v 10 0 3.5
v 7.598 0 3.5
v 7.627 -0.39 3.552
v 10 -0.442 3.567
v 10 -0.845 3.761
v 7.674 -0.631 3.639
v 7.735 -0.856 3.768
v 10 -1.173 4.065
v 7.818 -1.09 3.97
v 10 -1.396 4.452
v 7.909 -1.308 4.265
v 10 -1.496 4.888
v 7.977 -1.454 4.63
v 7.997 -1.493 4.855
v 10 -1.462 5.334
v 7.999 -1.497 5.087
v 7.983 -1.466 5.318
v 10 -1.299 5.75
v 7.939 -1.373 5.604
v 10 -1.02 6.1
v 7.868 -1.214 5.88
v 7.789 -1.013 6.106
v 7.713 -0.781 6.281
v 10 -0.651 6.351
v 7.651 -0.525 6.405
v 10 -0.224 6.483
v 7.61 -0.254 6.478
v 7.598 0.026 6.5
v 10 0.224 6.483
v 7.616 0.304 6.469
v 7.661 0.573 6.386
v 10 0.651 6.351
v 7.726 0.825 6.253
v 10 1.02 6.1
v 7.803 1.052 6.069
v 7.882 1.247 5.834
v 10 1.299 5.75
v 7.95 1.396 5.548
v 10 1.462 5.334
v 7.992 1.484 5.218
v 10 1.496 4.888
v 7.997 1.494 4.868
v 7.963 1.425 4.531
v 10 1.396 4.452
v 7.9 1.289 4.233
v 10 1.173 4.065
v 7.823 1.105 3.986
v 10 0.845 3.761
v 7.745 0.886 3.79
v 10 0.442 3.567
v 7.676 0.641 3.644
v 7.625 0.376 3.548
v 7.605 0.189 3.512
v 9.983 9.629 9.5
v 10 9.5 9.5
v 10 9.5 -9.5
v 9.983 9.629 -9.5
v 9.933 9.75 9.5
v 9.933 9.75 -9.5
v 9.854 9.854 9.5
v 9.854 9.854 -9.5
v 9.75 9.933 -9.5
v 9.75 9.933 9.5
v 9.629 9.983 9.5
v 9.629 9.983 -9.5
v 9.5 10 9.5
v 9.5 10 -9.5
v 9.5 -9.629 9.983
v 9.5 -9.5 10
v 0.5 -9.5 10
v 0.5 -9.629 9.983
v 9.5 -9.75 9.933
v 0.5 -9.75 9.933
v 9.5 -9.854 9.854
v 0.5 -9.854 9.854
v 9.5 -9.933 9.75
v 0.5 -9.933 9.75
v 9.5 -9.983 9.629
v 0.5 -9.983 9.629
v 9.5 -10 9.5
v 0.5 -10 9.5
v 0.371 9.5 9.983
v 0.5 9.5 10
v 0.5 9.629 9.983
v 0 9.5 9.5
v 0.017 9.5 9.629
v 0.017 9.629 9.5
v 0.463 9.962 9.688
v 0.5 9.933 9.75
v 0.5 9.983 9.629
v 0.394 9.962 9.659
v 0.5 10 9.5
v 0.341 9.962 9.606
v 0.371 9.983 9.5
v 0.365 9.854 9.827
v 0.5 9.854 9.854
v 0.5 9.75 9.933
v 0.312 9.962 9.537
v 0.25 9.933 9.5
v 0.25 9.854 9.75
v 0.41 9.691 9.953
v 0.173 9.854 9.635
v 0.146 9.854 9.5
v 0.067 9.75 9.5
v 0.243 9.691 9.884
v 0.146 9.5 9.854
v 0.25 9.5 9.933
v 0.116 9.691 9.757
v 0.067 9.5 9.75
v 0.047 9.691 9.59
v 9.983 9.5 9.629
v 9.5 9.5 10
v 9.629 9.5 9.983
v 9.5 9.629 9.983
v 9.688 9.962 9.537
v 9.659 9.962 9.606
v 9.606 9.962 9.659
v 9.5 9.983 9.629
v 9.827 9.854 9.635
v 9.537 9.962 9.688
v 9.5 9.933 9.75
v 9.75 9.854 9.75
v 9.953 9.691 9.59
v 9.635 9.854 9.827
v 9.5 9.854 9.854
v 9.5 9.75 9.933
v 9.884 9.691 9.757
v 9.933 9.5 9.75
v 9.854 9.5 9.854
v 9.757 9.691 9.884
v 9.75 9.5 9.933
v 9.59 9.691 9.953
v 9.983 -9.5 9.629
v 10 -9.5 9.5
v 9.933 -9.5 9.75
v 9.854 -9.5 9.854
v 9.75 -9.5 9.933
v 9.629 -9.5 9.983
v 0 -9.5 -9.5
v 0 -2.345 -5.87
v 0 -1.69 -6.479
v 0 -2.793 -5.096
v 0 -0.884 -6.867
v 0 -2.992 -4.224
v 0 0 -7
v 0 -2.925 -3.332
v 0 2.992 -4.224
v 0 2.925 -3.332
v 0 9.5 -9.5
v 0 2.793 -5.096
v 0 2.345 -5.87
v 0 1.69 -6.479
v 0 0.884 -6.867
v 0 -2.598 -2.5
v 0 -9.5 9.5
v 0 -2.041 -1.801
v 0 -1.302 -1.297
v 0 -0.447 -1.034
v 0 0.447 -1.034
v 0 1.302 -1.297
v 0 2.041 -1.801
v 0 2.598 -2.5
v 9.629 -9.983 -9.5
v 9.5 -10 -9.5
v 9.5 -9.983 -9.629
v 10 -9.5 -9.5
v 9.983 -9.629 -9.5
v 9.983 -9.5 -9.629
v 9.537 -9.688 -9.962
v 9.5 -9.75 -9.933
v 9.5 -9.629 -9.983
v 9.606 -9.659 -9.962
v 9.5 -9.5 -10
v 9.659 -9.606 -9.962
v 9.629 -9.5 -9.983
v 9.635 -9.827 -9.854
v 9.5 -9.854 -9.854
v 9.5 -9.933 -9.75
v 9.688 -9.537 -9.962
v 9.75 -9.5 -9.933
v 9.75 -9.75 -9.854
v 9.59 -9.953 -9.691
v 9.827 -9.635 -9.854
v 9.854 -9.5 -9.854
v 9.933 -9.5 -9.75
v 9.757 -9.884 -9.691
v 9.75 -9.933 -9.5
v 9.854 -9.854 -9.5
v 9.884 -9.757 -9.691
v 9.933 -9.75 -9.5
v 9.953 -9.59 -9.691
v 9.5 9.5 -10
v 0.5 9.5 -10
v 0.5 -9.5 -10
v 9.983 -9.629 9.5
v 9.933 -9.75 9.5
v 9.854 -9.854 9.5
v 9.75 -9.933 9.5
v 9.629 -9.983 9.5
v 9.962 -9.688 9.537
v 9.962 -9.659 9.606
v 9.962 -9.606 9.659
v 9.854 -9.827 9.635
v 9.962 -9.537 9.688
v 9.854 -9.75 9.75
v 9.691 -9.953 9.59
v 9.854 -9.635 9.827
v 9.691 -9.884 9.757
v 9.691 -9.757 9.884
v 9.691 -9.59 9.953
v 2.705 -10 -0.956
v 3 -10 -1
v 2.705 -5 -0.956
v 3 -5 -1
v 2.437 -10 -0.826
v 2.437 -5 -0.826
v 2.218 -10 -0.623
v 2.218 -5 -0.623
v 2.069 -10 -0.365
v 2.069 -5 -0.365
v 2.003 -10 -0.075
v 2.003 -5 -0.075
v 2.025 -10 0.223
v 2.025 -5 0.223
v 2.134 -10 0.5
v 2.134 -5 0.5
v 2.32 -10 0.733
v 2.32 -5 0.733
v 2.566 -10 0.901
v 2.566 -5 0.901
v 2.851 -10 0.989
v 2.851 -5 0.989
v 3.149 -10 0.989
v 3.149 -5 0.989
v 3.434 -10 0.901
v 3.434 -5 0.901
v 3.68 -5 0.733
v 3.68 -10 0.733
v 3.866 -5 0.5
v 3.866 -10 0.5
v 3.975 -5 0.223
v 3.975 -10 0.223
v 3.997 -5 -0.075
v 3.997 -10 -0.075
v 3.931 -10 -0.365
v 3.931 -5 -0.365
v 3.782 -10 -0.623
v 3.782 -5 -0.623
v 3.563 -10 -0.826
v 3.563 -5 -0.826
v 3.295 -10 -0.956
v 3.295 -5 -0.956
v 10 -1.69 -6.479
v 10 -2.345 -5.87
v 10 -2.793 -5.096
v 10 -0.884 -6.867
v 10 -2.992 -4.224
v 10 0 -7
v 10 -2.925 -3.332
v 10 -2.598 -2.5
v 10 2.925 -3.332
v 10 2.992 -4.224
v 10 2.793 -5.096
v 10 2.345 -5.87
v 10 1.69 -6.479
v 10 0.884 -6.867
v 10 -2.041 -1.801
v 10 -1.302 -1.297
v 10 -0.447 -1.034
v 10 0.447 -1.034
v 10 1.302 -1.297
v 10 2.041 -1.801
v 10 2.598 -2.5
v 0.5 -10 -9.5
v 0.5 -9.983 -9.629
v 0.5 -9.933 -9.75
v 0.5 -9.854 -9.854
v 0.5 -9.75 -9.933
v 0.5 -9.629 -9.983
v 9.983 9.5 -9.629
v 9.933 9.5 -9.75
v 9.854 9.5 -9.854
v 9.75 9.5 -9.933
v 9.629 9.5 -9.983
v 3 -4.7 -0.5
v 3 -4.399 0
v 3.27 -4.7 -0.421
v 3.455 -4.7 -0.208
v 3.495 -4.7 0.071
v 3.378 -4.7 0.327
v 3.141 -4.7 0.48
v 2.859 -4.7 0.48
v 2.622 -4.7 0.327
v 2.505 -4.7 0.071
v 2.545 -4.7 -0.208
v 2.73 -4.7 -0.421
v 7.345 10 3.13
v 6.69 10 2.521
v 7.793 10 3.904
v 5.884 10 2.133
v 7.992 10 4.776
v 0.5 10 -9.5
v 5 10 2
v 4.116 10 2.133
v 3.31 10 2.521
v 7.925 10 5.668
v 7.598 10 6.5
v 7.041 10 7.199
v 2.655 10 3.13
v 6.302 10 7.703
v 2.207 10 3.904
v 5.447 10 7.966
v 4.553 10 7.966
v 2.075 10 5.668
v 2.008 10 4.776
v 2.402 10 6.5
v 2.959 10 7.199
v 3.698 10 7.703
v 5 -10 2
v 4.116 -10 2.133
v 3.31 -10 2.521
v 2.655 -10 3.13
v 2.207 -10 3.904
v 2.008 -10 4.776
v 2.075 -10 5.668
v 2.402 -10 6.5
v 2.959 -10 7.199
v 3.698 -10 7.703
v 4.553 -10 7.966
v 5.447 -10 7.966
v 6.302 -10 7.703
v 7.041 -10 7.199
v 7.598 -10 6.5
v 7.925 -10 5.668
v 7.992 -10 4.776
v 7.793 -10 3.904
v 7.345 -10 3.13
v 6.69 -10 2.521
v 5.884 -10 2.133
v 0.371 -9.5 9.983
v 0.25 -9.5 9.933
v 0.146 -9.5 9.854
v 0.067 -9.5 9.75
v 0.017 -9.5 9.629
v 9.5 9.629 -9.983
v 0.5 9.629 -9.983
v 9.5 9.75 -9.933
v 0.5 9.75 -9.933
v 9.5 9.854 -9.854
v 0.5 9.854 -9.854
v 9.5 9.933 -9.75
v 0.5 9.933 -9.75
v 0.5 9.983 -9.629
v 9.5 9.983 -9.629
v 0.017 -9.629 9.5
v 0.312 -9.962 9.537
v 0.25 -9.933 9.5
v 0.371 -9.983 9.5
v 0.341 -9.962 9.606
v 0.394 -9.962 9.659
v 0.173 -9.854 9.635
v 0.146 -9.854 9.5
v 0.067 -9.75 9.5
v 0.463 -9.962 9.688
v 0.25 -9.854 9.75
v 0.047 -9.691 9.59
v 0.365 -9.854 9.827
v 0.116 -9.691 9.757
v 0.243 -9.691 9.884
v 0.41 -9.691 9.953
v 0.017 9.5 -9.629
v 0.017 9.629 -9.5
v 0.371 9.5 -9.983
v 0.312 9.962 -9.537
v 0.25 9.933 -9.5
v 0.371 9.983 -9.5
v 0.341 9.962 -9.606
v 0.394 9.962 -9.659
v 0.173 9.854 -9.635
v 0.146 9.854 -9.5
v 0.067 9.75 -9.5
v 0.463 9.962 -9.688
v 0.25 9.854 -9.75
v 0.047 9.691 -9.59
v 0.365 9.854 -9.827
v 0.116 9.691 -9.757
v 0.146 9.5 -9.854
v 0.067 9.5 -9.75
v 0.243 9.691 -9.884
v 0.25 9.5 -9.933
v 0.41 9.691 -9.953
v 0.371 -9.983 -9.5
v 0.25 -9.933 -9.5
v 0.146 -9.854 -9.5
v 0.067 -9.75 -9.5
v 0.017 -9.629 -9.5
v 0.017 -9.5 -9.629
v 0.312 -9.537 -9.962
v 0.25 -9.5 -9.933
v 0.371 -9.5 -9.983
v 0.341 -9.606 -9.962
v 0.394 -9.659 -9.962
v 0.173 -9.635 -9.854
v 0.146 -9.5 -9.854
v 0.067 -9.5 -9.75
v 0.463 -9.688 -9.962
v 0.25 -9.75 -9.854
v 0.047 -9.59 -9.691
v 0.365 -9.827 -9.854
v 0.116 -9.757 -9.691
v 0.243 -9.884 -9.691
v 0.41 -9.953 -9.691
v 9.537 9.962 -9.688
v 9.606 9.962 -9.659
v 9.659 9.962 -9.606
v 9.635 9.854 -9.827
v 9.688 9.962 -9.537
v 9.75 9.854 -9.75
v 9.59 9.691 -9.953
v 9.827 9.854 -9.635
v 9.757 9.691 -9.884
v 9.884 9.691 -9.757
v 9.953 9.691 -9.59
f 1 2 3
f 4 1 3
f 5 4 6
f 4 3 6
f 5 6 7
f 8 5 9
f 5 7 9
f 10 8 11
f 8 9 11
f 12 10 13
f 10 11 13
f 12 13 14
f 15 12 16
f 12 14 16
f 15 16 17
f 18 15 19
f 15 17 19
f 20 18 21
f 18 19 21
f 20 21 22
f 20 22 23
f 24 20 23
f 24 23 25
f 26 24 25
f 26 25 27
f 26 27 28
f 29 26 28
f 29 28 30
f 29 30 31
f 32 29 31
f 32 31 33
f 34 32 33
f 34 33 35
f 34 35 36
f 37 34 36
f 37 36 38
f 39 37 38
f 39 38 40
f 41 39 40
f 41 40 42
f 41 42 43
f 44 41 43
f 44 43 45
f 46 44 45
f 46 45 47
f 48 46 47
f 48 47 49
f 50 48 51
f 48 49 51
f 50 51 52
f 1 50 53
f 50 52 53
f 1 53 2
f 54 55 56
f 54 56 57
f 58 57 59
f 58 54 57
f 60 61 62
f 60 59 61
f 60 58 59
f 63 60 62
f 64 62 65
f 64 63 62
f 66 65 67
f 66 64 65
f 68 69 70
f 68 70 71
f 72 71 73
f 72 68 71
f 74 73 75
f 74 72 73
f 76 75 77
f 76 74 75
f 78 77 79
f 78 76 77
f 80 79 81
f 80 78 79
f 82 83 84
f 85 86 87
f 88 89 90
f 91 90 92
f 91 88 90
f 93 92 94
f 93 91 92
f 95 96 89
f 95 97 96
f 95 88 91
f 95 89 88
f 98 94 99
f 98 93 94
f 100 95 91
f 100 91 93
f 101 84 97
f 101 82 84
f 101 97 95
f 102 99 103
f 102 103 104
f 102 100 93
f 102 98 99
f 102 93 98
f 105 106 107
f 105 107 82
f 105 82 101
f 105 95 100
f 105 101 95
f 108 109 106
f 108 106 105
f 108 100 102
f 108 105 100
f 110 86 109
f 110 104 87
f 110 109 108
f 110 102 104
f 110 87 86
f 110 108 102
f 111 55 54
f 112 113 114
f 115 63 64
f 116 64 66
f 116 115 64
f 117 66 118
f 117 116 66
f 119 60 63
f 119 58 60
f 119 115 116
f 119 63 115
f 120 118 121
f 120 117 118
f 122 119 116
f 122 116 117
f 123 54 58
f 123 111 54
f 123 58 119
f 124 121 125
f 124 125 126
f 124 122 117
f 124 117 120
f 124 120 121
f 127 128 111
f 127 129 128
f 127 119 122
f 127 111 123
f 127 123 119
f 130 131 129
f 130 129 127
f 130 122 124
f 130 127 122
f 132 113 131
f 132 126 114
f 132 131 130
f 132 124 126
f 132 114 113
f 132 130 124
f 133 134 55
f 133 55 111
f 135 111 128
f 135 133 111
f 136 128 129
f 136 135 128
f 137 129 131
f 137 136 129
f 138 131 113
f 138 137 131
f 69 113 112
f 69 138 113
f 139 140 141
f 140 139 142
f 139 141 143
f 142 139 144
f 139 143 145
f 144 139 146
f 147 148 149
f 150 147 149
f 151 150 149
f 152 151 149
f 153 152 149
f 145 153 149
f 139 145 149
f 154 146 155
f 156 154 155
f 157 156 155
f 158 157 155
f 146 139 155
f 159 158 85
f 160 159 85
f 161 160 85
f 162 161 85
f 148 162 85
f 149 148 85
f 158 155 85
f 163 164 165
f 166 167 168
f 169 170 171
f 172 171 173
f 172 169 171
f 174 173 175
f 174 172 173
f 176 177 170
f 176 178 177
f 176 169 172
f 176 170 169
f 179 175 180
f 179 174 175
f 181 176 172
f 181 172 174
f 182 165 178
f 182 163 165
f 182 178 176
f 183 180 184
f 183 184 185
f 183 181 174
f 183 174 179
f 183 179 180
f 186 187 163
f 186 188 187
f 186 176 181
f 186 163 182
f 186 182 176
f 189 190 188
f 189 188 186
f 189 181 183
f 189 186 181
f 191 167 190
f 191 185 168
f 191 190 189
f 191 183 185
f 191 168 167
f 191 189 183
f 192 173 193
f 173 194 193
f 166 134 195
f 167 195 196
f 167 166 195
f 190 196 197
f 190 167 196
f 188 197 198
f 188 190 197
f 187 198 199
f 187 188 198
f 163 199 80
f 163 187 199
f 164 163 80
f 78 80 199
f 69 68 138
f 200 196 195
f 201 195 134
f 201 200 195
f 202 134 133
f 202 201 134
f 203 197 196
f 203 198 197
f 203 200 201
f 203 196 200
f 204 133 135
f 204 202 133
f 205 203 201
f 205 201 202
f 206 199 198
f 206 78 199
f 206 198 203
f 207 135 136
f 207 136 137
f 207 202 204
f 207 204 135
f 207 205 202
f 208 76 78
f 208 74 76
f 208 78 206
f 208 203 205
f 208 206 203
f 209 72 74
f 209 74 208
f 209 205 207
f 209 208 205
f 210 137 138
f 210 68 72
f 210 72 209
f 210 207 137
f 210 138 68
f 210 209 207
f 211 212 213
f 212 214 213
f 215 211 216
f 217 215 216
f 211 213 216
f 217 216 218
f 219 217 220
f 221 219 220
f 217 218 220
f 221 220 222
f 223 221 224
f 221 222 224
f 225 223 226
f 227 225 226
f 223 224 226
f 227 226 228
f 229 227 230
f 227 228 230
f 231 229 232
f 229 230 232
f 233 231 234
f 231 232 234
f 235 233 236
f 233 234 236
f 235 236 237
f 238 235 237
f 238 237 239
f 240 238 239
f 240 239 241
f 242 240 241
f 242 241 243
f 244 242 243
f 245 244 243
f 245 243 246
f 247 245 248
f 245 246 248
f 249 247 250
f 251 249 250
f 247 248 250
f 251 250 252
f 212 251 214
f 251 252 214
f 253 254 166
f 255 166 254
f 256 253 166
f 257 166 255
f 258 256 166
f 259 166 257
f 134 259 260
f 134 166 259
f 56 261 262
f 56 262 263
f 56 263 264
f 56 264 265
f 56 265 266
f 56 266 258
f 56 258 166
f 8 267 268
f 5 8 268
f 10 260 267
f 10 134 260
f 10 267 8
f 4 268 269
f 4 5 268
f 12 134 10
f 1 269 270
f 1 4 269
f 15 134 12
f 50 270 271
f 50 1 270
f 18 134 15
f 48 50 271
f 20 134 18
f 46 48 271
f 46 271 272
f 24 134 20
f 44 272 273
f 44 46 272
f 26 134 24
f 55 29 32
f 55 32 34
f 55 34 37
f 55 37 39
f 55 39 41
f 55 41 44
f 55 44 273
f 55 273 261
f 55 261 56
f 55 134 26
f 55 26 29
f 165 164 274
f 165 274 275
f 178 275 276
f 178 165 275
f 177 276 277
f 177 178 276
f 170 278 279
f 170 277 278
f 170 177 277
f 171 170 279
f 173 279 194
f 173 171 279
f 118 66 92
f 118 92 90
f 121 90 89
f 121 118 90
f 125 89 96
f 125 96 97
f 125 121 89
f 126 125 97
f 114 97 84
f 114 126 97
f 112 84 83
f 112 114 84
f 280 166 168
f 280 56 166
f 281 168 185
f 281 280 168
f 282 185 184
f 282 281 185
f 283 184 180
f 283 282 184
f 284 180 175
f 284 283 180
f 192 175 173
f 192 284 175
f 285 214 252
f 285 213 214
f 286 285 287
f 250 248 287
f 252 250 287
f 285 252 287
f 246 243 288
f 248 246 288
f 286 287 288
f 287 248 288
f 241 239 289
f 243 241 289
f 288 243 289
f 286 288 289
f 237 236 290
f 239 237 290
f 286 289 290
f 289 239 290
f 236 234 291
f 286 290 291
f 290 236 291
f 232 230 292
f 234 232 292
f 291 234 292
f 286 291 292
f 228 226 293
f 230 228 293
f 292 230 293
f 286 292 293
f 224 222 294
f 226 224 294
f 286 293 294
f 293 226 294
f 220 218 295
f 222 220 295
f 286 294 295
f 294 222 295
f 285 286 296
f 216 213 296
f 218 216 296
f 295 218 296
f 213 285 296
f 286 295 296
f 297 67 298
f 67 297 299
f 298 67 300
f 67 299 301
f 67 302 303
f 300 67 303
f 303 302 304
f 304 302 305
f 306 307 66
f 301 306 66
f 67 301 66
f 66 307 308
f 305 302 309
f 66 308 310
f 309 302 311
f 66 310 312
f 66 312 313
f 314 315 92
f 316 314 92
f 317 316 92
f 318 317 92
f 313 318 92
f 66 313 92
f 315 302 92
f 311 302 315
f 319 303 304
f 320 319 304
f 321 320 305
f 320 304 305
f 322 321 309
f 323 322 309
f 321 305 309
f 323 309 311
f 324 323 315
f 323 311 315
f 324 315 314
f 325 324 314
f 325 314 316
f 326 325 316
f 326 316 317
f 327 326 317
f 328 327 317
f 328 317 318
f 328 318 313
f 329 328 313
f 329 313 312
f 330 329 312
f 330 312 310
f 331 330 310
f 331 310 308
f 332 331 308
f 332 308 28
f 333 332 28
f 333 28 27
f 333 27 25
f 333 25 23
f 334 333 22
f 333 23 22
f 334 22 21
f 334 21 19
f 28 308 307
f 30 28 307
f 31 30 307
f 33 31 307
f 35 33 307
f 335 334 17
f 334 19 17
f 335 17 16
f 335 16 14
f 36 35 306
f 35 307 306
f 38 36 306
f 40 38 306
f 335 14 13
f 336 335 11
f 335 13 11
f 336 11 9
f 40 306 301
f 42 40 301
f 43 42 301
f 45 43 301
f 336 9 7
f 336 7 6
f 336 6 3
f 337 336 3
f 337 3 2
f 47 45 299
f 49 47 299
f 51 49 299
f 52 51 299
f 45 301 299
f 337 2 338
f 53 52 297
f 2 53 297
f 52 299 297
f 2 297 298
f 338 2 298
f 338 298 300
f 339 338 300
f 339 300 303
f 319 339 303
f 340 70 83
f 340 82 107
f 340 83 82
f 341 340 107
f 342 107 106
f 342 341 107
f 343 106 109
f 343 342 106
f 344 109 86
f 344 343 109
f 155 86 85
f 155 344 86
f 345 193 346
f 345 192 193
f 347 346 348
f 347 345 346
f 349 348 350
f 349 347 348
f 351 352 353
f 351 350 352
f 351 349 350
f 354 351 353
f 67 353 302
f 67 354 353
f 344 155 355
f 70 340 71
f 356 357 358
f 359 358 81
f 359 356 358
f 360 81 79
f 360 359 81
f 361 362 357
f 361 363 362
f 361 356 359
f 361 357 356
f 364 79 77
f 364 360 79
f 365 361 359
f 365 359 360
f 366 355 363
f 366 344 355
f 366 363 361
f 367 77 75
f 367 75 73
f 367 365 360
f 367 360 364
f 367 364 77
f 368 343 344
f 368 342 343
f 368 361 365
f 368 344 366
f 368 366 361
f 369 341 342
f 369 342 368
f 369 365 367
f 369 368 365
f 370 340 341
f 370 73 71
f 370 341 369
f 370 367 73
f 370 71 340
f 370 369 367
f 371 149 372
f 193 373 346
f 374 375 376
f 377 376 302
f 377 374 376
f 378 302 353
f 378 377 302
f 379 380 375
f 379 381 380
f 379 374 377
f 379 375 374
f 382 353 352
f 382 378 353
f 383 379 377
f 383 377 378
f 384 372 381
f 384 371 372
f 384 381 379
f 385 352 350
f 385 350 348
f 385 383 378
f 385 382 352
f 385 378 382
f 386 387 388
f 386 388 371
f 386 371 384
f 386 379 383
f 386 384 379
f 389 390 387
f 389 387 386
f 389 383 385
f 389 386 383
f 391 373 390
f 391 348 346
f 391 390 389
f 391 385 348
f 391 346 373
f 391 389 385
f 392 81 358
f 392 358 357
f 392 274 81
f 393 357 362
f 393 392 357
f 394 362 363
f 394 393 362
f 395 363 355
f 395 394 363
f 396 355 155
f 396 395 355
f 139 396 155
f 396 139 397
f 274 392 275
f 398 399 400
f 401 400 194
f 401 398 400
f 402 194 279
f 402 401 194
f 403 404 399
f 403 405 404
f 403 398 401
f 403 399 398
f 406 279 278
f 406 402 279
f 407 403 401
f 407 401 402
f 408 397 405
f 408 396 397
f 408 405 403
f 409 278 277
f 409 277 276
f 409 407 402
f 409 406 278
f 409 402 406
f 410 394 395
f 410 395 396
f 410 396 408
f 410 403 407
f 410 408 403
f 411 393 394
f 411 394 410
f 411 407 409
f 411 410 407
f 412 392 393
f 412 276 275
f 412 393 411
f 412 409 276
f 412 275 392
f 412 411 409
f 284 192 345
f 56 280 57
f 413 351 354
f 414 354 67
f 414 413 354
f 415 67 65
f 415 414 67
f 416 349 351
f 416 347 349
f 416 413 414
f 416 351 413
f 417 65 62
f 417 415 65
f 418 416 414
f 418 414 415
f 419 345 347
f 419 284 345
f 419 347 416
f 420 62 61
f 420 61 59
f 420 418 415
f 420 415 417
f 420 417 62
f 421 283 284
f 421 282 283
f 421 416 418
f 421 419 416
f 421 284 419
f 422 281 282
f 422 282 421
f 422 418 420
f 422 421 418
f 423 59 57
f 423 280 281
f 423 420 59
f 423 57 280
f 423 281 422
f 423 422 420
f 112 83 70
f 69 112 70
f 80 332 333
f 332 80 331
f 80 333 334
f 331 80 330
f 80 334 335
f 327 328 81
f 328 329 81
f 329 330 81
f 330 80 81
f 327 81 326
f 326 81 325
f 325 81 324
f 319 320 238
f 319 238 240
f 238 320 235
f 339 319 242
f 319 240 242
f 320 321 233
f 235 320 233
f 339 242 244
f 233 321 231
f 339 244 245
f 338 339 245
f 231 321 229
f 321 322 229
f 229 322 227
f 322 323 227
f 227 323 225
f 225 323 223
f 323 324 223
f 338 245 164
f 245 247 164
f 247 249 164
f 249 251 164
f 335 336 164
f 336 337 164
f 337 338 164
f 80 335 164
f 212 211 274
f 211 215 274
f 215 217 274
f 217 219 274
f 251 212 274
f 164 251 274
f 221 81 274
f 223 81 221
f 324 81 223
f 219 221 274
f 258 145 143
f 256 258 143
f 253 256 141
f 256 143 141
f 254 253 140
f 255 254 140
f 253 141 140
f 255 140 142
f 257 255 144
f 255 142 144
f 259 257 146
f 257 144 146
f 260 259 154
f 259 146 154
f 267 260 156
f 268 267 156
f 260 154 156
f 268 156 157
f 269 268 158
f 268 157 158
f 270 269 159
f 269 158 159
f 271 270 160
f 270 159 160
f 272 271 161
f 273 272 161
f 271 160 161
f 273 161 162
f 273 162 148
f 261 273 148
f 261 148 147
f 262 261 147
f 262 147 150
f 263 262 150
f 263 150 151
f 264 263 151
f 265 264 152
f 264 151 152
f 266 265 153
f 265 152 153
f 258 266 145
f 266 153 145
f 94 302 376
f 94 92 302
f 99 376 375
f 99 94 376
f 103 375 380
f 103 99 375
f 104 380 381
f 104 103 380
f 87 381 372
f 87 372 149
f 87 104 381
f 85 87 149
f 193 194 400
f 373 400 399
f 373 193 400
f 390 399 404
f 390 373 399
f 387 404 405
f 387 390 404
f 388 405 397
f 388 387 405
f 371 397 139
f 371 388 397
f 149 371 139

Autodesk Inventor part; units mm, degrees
ref_plane "YZ Plane" through (0, 0, 0) normal (1, 0, 0) x (0, 1, 0)
ref_plane "XZ Plane" through (0, 0, 0) normal (0, 1, 0) x (-1, 0, 0)
ref_plane "XY Plane" through (0, 0, 0) normal (0, 0, 1) x (1, 0, 0)
sketch "Szkic1" plane through (0, 0, 0) normal (1, 0, 0) x (0, 1, 0)
  line L0 (10, 10) -> (-10, 10)
  line L1 (-10, 10) -> (-10, -10)
  line L2 (-10, -10) -> (10, -10)
  line L3 (10, -10) -> (10, 10)
  line L4 (0, 0) -> (10, 0) construction
  line L5 (0, 0) -> (0, -10) construction
  dimension "d0" = 20
  dimension "d1" = 20
extrude "Wyciągnięcie proste1" add sketch "Szkic1" along normal blind 10
sketch "Szkic2" plane through (10, 0, 0) normal (1, 0, 0) x (0, 0, -1)
  line L0 (10, -10) -> (10, 10) projected
  point P0 (0, 0)
  point P1 (4, 0)
  dimension "d4" = 6
hole "Otwór1" at (10, 0, -4) direction (-1, 0, 0) diameter 6 end through all
sketch "Szkic3" plane through (0, -10, -10) normal (0, -1, 0) x (1, 0, 0)
  line L0 (0, 20) -> (0, 0) projected
  line L1 (0, 20) -> (10, 20) projected
  point P0 (0, 10)
  point P1 (5, 15)
  dimension "d12" = 5
  dimension "d13" = 5
hole "Otwór2" at (5, -10, 5) direction (0, 1, 0) diameter 6 end through all
sketch "Szkic4" plane through (0, -10, -10) normal (0, -1, 0) x (1, 0, 0)
  line L0 (0, 20) -> (0, 0) projected
  point P0 (0, 10)
  point P1 (3, 10)
  point P2 (0, 10)
  dimension "d21" = 3
hole "Otwór3" at (3, -10, 0) direction (0, 1, 0) diameter 2 depth 5 tip angle 118
sketch "Szkic5" plane through (10, 0, 0) normal (1, 0, 0) x (0, 0, -1)
  line L0 (-2, -10) -> (-8, -10) projected
  line L1 (-10, 10) -> (-10, -10) projected
  point P0 (0, 0)
  point P1 (-5, 0)
  dimension "d29" = 5
hole "Otwór4" at (10, 0, 5) direction (-1, 0, 0) diameter 3 depth 5 tip angle 118
thread "Gwint1" size "M3x0.5" class "6H" standard "ANSI Metric M Profile" full length
thread "Gwint2" size "M6x1" class "6H" standard "ANSI Metric M Profile" full length
fillet "Zaokrąglenie1" radius 0.5 12 edges at (0, 0, 10) (0, -10, 0) (5, -10, 10) (10, -10, 0) (10, 0, 10) (5, -10, -10) (0, 0, -10) (10, 0, -10) (5, 10, -10) (0, 10, 0) (10, 10, 0) (5, 10, 10)
properties part number "HotBlock"
